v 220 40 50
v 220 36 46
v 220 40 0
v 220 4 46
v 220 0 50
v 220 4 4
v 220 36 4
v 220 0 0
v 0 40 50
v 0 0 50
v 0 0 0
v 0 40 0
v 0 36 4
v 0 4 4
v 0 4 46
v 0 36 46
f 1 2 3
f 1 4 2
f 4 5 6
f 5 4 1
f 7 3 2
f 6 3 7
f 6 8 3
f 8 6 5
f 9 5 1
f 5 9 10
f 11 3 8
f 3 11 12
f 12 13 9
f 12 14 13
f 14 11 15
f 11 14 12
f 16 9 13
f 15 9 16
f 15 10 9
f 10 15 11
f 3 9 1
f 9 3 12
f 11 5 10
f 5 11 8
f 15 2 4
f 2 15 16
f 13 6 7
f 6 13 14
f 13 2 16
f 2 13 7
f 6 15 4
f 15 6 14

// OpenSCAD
$fn = 32;

// ----------------------------------------------------------------------
// Box beam: 200-250 mm hollow beam
// ----------------------------------------------------------------------

// --- parameters (mm) ---
beam_l = 220;             // beam length, X
beam_w = 40;              // beam width, Y
beam_h = 50;              // beam height, Z
wall = 4;                 // wall thickness

difference() {
  cube([beam_l, beam_w, beam_h]);
  translate([-1, wall, wall])
    cube([beam_l + 2, beam_w - 2 * wall, beam_h - 2 * wall]);
}
